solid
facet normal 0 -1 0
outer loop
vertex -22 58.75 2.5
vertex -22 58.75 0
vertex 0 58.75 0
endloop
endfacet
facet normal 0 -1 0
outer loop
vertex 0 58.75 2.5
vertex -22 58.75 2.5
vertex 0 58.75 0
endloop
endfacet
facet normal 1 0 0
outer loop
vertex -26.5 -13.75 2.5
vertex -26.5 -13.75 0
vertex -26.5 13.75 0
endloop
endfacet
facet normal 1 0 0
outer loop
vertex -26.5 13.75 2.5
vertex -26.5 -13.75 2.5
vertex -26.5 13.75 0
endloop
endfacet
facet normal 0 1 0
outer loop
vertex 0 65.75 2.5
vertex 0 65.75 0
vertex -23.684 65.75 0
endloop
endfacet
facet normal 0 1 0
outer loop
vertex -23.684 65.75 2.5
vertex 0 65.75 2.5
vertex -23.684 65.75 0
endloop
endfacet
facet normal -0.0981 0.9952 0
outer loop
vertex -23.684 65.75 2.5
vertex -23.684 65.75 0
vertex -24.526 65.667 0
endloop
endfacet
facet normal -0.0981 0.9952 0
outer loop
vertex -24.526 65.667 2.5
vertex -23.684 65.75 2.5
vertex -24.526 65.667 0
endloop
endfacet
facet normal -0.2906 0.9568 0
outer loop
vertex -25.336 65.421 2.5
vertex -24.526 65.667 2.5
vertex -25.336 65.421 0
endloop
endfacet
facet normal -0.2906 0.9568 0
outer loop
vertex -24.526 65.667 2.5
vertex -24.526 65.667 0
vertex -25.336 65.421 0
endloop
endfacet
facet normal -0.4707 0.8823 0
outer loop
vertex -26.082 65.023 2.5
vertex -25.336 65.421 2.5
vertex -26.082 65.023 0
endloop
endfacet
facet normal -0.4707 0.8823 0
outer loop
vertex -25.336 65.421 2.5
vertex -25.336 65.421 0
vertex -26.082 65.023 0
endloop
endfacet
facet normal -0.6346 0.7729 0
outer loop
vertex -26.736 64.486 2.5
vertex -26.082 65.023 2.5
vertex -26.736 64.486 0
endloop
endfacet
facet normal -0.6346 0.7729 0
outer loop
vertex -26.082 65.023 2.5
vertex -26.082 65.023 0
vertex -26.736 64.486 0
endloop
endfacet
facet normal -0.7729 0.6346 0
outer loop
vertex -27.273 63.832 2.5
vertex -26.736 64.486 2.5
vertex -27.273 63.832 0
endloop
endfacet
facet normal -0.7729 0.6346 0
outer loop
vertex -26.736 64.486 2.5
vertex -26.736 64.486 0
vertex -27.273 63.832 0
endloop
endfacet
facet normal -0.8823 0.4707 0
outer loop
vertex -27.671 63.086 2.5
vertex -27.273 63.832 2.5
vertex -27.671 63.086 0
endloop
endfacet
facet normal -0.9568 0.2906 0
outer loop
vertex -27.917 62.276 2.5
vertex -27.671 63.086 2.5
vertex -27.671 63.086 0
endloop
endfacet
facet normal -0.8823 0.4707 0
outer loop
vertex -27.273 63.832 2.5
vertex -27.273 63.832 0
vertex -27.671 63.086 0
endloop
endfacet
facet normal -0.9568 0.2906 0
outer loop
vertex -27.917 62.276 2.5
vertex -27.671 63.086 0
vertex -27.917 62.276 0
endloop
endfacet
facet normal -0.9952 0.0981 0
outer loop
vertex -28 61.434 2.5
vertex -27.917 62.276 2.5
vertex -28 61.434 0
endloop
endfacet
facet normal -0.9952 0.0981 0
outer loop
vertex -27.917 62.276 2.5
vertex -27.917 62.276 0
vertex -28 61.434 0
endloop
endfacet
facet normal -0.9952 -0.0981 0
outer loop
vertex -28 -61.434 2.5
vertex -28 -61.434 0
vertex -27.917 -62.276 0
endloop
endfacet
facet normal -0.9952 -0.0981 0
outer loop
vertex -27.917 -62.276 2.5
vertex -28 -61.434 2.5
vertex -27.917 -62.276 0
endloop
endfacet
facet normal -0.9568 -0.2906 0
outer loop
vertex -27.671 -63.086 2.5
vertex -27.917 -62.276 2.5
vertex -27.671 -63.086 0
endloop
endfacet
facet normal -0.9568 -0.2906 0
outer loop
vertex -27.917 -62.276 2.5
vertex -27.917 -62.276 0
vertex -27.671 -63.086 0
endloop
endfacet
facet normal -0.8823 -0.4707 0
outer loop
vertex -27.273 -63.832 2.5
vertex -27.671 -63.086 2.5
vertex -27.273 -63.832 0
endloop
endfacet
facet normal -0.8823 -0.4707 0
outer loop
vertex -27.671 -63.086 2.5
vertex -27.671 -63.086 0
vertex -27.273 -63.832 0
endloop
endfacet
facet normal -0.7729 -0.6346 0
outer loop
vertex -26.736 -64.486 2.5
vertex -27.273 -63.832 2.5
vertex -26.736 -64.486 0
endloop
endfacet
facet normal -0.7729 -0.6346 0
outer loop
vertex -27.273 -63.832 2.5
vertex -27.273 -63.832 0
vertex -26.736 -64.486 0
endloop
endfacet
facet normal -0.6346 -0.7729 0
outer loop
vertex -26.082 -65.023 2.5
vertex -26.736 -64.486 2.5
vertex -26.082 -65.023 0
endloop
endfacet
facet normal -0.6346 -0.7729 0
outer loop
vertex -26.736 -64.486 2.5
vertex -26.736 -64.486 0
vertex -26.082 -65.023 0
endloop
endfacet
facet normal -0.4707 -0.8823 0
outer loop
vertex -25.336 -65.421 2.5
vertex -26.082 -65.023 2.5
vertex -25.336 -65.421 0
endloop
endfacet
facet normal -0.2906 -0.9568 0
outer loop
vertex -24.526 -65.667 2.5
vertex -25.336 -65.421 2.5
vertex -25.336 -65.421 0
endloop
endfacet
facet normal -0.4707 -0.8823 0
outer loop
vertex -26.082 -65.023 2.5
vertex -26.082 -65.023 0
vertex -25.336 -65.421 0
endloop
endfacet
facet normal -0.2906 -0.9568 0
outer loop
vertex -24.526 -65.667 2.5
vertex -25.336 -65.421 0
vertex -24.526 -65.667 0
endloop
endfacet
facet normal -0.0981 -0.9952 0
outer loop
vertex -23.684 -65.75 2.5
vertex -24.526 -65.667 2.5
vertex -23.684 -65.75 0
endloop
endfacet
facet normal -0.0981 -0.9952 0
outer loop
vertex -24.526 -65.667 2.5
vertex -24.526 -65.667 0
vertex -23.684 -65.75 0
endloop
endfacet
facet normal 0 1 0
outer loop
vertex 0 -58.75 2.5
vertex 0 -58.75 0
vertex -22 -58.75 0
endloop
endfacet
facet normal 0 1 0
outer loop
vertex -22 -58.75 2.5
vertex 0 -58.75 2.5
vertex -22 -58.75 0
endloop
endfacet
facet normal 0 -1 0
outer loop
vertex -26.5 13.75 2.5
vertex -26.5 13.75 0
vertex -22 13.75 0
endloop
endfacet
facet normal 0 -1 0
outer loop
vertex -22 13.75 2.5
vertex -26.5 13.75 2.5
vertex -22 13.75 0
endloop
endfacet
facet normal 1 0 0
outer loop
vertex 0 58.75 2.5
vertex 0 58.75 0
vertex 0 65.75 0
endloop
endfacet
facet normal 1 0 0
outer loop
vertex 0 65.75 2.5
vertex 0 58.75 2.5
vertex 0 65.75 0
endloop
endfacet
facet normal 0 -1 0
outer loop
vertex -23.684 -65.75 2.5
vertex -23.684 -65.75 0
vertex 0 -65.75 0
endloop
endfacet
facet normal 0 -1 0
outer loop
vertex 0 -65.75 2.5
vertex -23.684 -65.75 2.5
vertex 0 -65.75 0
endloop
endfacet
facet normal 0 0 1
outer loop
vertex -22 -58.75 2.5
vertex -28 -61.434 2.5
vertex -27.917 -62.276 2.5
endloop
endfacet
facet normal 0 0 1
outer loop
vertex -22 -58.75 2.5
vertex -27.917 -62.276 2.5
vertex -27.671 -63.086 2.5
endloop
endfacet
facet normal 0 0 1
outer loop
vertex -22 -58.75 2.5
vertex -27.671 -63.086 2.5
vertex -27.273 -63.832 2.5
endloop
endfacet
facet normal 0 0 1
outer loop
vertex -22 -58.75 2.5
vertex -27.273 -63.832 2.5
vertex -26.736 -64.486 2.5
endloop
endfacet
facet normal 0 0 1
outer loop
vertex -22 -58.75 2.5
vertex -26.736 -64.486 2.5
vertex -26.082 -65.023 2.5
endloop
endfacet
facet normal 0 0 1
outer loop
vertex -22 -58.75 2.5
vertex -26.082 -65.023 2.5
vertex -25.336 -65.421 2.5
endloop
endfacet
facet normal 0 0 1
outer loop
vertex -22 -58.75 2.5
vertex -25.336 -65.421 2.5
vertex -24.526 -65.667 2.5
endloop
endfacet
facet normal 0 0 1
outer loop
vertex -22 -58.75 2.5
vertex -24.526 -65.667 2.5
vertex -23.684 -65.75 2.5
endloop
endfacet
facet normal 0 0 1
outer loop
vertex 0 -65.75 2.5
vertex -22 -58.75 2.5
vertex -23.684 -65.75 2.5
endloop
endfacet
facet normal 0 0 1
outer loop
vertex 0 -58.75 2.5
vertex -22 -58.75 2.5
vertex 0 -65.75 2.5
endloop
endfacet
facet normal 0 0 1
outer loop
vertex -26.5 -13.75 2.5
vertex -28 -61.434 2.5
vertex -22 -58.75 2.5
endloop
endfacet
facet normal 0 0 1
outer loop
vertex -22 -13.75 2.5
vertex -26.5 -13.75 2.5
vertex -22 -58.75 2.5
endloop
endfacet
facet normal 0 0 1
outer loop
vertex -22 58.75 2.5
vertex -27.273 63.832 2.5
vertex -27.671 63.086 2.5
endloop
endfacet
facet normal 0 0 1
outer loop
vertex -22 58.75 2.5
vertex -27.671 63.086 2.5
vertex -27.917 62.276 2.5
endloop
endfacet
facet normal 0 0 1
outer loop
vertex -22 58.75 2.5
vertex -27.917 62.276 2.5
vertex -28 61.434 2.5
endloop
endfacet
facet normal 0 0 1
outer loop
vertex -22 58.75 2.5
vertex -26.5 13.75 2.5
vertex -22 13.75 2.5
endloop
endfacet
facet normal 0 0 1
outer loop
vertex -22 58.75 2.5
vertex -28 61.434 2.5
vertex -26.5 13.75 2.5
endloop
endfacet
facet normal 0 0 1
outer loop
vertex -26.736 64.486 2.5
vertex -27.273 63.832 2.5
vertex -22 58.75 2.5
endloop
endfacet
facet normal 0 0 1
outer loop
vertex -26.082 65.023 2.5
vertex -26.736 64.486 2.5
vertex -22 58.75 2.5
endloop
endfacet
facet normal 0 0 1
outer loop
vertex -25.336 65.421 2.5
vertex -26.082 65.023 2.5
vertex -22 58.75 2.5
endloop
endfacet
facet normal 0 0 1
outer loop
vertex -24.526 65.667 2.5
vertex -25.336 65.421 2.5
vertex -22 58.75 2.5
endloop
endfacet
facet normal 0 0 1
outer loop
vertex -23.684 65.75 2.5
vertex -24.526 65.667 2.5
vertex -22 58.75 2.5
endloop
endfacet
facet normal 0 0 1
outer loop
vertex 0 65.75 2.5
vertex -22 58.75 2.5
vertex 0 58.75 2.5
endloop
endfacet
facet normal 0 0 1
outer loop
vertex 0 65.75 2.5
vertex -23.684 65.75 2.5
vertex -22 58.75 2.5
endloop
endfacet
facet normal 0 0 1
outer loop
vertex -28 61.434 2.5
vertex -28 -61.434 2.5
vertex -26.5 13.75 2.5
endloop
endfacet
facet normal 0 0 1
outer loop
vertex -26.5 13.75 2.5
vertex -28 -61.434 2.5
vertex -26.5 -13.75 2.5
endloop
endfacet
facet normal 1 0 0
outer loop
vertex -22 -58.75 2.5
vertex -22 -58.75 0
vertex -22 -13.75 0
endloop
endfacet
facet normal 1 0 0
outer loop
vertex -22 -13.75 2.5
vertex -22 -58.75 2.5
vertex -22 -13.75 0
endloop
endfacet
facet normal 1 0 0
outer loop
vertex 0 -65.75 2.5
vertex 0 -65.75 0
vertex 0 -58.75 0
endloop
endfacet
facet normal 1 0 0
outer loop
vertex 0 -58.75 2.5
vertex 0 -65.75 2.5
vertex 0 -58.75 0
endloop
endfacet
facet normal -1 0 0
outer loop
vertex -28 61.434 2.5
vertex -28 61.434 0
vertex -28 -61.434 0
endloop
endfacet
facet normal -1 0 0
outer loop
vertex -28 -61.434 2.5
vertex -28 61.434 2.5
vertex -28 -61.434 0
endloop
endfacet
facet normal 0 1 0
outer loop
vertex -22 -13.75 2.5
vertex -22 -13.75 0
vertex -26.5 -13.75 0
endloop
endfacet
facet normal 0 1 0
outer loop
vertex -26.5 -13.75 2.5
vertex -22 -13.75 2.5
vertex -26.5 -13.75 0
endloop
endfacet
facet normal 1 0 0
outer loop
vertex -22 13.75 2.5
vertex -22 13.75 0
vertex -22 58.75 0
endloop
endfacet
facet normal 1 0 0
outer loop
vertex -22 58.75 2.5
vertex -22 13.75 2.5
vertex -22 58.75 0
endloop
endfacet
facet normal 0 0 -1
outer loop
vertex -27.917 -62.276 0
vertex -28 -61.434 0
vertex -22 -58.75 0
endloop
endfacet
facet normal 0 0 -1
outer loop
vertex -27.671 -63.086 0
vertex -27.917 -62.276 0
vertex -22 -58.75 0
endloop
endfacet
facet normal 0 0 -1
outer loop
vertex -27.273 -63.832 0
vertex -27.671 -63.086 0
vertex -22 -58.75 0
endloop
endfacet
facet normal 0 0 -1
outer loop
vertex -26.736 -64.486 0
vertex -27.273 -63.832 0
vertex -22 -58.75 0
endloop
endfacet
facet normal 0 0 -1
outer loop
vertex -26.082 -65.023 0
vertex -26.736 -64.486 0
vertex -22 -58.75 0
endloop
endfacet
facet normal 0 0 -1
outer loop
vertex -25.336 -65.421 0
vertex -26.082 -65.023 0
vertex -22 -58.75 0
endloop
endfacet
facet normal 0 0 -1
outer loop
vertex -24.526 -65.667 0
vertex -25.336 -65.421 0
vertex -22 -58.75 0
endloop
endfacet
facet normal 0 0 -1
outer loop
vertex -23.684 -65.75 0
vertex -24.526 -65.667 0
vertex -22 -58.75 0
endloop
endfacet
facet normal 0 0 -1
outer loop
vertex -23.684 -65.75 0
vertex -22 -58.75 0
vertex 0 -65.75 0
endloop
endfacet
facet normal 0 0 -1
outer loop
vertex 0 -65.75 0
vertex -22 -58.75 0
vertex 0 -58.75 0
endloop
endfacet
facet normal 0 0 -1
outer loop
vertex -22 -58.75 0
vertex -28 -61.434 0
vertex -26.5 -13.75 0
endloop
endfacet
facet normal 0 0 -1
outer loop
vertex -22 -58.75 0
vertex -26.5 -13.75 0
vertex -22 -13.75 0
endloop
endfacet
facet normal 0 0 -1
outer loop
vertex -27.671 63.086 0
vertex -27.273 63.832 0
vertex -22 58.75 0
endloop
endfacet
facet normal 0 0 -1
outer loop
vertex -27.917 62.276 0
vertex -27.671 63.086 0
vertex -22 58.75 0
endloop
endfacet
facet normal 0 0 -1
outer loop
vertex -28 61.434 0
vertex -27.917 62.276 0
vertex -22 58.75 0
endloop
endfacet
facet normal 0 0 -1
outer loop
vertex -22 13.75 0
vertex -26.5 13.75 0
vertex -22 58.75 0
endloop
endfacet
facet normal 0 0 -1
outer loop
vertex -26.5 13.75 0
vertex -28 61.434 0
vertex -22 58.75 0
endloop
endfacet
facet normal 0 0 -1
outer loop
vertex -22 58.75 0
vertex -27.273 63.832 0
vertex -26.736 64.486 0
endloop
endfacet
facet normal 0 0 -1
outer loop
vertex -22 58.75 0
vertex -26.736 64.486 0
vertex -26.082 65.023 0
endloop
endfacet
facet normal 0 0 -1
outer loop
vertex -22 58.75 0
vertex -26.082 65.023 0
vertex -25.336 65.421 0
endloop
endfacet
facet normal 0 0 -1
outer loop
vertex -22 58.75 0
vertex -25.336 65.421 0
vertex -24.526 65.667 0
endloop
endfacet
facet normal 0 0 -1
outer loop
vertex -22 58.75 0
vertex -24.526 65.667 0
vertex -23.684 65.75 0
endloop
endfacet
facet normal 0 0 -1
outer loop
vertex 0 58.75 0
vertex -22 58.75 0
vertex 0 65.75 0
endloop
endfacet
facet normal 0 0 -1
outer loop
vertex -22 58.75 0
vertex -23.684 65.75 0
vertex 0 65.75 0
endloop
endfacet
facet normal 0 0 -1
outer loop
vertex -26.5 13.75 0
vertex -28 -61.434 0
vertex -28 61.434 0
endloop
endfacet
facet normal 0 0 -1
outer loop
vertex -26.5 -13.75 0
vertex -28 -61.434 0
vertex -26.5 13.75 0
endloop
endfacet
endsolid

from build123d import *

# Parameters (mm, degrees)
F1_DEPTH = 2.5


with BuildPart() as f1:
    # F0 (on Top) → F1 (new body)
    with BuildSketch(Plane.XY):
        with BuildLine():
            Line((-22, 58.75), (0, 58.75))
            Line((0, 58.75), (0, 65.75))
            Line((0, 65.75), (-23.68421, 65.75))
            ThreePointArc((-23.68421, 65.75), (-26.735934, 64.485934), (-28, 61.43421))
            Line((-28, 61.43421), (-28, -61.43421))
            ThreePointArc((-28, -61.43421), (-26.735934, -64.485934), (-23.68421, -65.75))
            Line((-23.68421, -65.75), (0, -65.75))
            Line((0, -65.75), (0, -58.75))
            Line((0, -58.75), (-22, -58.75))
            Line((-22, -58.75), (-22, -13.75))
            Line((-22, -13.75), (-26.5, -13.75))
            Line((-26.5, -13.75), (-26.5, 13.75))
            Line((-26.5, 13.75), (-22, 13.75))
            Line((-22, 13.75), (-22, 58.75))
        make_face()
    extrude(amount=F1_DEPTH)


solid = f1.part
